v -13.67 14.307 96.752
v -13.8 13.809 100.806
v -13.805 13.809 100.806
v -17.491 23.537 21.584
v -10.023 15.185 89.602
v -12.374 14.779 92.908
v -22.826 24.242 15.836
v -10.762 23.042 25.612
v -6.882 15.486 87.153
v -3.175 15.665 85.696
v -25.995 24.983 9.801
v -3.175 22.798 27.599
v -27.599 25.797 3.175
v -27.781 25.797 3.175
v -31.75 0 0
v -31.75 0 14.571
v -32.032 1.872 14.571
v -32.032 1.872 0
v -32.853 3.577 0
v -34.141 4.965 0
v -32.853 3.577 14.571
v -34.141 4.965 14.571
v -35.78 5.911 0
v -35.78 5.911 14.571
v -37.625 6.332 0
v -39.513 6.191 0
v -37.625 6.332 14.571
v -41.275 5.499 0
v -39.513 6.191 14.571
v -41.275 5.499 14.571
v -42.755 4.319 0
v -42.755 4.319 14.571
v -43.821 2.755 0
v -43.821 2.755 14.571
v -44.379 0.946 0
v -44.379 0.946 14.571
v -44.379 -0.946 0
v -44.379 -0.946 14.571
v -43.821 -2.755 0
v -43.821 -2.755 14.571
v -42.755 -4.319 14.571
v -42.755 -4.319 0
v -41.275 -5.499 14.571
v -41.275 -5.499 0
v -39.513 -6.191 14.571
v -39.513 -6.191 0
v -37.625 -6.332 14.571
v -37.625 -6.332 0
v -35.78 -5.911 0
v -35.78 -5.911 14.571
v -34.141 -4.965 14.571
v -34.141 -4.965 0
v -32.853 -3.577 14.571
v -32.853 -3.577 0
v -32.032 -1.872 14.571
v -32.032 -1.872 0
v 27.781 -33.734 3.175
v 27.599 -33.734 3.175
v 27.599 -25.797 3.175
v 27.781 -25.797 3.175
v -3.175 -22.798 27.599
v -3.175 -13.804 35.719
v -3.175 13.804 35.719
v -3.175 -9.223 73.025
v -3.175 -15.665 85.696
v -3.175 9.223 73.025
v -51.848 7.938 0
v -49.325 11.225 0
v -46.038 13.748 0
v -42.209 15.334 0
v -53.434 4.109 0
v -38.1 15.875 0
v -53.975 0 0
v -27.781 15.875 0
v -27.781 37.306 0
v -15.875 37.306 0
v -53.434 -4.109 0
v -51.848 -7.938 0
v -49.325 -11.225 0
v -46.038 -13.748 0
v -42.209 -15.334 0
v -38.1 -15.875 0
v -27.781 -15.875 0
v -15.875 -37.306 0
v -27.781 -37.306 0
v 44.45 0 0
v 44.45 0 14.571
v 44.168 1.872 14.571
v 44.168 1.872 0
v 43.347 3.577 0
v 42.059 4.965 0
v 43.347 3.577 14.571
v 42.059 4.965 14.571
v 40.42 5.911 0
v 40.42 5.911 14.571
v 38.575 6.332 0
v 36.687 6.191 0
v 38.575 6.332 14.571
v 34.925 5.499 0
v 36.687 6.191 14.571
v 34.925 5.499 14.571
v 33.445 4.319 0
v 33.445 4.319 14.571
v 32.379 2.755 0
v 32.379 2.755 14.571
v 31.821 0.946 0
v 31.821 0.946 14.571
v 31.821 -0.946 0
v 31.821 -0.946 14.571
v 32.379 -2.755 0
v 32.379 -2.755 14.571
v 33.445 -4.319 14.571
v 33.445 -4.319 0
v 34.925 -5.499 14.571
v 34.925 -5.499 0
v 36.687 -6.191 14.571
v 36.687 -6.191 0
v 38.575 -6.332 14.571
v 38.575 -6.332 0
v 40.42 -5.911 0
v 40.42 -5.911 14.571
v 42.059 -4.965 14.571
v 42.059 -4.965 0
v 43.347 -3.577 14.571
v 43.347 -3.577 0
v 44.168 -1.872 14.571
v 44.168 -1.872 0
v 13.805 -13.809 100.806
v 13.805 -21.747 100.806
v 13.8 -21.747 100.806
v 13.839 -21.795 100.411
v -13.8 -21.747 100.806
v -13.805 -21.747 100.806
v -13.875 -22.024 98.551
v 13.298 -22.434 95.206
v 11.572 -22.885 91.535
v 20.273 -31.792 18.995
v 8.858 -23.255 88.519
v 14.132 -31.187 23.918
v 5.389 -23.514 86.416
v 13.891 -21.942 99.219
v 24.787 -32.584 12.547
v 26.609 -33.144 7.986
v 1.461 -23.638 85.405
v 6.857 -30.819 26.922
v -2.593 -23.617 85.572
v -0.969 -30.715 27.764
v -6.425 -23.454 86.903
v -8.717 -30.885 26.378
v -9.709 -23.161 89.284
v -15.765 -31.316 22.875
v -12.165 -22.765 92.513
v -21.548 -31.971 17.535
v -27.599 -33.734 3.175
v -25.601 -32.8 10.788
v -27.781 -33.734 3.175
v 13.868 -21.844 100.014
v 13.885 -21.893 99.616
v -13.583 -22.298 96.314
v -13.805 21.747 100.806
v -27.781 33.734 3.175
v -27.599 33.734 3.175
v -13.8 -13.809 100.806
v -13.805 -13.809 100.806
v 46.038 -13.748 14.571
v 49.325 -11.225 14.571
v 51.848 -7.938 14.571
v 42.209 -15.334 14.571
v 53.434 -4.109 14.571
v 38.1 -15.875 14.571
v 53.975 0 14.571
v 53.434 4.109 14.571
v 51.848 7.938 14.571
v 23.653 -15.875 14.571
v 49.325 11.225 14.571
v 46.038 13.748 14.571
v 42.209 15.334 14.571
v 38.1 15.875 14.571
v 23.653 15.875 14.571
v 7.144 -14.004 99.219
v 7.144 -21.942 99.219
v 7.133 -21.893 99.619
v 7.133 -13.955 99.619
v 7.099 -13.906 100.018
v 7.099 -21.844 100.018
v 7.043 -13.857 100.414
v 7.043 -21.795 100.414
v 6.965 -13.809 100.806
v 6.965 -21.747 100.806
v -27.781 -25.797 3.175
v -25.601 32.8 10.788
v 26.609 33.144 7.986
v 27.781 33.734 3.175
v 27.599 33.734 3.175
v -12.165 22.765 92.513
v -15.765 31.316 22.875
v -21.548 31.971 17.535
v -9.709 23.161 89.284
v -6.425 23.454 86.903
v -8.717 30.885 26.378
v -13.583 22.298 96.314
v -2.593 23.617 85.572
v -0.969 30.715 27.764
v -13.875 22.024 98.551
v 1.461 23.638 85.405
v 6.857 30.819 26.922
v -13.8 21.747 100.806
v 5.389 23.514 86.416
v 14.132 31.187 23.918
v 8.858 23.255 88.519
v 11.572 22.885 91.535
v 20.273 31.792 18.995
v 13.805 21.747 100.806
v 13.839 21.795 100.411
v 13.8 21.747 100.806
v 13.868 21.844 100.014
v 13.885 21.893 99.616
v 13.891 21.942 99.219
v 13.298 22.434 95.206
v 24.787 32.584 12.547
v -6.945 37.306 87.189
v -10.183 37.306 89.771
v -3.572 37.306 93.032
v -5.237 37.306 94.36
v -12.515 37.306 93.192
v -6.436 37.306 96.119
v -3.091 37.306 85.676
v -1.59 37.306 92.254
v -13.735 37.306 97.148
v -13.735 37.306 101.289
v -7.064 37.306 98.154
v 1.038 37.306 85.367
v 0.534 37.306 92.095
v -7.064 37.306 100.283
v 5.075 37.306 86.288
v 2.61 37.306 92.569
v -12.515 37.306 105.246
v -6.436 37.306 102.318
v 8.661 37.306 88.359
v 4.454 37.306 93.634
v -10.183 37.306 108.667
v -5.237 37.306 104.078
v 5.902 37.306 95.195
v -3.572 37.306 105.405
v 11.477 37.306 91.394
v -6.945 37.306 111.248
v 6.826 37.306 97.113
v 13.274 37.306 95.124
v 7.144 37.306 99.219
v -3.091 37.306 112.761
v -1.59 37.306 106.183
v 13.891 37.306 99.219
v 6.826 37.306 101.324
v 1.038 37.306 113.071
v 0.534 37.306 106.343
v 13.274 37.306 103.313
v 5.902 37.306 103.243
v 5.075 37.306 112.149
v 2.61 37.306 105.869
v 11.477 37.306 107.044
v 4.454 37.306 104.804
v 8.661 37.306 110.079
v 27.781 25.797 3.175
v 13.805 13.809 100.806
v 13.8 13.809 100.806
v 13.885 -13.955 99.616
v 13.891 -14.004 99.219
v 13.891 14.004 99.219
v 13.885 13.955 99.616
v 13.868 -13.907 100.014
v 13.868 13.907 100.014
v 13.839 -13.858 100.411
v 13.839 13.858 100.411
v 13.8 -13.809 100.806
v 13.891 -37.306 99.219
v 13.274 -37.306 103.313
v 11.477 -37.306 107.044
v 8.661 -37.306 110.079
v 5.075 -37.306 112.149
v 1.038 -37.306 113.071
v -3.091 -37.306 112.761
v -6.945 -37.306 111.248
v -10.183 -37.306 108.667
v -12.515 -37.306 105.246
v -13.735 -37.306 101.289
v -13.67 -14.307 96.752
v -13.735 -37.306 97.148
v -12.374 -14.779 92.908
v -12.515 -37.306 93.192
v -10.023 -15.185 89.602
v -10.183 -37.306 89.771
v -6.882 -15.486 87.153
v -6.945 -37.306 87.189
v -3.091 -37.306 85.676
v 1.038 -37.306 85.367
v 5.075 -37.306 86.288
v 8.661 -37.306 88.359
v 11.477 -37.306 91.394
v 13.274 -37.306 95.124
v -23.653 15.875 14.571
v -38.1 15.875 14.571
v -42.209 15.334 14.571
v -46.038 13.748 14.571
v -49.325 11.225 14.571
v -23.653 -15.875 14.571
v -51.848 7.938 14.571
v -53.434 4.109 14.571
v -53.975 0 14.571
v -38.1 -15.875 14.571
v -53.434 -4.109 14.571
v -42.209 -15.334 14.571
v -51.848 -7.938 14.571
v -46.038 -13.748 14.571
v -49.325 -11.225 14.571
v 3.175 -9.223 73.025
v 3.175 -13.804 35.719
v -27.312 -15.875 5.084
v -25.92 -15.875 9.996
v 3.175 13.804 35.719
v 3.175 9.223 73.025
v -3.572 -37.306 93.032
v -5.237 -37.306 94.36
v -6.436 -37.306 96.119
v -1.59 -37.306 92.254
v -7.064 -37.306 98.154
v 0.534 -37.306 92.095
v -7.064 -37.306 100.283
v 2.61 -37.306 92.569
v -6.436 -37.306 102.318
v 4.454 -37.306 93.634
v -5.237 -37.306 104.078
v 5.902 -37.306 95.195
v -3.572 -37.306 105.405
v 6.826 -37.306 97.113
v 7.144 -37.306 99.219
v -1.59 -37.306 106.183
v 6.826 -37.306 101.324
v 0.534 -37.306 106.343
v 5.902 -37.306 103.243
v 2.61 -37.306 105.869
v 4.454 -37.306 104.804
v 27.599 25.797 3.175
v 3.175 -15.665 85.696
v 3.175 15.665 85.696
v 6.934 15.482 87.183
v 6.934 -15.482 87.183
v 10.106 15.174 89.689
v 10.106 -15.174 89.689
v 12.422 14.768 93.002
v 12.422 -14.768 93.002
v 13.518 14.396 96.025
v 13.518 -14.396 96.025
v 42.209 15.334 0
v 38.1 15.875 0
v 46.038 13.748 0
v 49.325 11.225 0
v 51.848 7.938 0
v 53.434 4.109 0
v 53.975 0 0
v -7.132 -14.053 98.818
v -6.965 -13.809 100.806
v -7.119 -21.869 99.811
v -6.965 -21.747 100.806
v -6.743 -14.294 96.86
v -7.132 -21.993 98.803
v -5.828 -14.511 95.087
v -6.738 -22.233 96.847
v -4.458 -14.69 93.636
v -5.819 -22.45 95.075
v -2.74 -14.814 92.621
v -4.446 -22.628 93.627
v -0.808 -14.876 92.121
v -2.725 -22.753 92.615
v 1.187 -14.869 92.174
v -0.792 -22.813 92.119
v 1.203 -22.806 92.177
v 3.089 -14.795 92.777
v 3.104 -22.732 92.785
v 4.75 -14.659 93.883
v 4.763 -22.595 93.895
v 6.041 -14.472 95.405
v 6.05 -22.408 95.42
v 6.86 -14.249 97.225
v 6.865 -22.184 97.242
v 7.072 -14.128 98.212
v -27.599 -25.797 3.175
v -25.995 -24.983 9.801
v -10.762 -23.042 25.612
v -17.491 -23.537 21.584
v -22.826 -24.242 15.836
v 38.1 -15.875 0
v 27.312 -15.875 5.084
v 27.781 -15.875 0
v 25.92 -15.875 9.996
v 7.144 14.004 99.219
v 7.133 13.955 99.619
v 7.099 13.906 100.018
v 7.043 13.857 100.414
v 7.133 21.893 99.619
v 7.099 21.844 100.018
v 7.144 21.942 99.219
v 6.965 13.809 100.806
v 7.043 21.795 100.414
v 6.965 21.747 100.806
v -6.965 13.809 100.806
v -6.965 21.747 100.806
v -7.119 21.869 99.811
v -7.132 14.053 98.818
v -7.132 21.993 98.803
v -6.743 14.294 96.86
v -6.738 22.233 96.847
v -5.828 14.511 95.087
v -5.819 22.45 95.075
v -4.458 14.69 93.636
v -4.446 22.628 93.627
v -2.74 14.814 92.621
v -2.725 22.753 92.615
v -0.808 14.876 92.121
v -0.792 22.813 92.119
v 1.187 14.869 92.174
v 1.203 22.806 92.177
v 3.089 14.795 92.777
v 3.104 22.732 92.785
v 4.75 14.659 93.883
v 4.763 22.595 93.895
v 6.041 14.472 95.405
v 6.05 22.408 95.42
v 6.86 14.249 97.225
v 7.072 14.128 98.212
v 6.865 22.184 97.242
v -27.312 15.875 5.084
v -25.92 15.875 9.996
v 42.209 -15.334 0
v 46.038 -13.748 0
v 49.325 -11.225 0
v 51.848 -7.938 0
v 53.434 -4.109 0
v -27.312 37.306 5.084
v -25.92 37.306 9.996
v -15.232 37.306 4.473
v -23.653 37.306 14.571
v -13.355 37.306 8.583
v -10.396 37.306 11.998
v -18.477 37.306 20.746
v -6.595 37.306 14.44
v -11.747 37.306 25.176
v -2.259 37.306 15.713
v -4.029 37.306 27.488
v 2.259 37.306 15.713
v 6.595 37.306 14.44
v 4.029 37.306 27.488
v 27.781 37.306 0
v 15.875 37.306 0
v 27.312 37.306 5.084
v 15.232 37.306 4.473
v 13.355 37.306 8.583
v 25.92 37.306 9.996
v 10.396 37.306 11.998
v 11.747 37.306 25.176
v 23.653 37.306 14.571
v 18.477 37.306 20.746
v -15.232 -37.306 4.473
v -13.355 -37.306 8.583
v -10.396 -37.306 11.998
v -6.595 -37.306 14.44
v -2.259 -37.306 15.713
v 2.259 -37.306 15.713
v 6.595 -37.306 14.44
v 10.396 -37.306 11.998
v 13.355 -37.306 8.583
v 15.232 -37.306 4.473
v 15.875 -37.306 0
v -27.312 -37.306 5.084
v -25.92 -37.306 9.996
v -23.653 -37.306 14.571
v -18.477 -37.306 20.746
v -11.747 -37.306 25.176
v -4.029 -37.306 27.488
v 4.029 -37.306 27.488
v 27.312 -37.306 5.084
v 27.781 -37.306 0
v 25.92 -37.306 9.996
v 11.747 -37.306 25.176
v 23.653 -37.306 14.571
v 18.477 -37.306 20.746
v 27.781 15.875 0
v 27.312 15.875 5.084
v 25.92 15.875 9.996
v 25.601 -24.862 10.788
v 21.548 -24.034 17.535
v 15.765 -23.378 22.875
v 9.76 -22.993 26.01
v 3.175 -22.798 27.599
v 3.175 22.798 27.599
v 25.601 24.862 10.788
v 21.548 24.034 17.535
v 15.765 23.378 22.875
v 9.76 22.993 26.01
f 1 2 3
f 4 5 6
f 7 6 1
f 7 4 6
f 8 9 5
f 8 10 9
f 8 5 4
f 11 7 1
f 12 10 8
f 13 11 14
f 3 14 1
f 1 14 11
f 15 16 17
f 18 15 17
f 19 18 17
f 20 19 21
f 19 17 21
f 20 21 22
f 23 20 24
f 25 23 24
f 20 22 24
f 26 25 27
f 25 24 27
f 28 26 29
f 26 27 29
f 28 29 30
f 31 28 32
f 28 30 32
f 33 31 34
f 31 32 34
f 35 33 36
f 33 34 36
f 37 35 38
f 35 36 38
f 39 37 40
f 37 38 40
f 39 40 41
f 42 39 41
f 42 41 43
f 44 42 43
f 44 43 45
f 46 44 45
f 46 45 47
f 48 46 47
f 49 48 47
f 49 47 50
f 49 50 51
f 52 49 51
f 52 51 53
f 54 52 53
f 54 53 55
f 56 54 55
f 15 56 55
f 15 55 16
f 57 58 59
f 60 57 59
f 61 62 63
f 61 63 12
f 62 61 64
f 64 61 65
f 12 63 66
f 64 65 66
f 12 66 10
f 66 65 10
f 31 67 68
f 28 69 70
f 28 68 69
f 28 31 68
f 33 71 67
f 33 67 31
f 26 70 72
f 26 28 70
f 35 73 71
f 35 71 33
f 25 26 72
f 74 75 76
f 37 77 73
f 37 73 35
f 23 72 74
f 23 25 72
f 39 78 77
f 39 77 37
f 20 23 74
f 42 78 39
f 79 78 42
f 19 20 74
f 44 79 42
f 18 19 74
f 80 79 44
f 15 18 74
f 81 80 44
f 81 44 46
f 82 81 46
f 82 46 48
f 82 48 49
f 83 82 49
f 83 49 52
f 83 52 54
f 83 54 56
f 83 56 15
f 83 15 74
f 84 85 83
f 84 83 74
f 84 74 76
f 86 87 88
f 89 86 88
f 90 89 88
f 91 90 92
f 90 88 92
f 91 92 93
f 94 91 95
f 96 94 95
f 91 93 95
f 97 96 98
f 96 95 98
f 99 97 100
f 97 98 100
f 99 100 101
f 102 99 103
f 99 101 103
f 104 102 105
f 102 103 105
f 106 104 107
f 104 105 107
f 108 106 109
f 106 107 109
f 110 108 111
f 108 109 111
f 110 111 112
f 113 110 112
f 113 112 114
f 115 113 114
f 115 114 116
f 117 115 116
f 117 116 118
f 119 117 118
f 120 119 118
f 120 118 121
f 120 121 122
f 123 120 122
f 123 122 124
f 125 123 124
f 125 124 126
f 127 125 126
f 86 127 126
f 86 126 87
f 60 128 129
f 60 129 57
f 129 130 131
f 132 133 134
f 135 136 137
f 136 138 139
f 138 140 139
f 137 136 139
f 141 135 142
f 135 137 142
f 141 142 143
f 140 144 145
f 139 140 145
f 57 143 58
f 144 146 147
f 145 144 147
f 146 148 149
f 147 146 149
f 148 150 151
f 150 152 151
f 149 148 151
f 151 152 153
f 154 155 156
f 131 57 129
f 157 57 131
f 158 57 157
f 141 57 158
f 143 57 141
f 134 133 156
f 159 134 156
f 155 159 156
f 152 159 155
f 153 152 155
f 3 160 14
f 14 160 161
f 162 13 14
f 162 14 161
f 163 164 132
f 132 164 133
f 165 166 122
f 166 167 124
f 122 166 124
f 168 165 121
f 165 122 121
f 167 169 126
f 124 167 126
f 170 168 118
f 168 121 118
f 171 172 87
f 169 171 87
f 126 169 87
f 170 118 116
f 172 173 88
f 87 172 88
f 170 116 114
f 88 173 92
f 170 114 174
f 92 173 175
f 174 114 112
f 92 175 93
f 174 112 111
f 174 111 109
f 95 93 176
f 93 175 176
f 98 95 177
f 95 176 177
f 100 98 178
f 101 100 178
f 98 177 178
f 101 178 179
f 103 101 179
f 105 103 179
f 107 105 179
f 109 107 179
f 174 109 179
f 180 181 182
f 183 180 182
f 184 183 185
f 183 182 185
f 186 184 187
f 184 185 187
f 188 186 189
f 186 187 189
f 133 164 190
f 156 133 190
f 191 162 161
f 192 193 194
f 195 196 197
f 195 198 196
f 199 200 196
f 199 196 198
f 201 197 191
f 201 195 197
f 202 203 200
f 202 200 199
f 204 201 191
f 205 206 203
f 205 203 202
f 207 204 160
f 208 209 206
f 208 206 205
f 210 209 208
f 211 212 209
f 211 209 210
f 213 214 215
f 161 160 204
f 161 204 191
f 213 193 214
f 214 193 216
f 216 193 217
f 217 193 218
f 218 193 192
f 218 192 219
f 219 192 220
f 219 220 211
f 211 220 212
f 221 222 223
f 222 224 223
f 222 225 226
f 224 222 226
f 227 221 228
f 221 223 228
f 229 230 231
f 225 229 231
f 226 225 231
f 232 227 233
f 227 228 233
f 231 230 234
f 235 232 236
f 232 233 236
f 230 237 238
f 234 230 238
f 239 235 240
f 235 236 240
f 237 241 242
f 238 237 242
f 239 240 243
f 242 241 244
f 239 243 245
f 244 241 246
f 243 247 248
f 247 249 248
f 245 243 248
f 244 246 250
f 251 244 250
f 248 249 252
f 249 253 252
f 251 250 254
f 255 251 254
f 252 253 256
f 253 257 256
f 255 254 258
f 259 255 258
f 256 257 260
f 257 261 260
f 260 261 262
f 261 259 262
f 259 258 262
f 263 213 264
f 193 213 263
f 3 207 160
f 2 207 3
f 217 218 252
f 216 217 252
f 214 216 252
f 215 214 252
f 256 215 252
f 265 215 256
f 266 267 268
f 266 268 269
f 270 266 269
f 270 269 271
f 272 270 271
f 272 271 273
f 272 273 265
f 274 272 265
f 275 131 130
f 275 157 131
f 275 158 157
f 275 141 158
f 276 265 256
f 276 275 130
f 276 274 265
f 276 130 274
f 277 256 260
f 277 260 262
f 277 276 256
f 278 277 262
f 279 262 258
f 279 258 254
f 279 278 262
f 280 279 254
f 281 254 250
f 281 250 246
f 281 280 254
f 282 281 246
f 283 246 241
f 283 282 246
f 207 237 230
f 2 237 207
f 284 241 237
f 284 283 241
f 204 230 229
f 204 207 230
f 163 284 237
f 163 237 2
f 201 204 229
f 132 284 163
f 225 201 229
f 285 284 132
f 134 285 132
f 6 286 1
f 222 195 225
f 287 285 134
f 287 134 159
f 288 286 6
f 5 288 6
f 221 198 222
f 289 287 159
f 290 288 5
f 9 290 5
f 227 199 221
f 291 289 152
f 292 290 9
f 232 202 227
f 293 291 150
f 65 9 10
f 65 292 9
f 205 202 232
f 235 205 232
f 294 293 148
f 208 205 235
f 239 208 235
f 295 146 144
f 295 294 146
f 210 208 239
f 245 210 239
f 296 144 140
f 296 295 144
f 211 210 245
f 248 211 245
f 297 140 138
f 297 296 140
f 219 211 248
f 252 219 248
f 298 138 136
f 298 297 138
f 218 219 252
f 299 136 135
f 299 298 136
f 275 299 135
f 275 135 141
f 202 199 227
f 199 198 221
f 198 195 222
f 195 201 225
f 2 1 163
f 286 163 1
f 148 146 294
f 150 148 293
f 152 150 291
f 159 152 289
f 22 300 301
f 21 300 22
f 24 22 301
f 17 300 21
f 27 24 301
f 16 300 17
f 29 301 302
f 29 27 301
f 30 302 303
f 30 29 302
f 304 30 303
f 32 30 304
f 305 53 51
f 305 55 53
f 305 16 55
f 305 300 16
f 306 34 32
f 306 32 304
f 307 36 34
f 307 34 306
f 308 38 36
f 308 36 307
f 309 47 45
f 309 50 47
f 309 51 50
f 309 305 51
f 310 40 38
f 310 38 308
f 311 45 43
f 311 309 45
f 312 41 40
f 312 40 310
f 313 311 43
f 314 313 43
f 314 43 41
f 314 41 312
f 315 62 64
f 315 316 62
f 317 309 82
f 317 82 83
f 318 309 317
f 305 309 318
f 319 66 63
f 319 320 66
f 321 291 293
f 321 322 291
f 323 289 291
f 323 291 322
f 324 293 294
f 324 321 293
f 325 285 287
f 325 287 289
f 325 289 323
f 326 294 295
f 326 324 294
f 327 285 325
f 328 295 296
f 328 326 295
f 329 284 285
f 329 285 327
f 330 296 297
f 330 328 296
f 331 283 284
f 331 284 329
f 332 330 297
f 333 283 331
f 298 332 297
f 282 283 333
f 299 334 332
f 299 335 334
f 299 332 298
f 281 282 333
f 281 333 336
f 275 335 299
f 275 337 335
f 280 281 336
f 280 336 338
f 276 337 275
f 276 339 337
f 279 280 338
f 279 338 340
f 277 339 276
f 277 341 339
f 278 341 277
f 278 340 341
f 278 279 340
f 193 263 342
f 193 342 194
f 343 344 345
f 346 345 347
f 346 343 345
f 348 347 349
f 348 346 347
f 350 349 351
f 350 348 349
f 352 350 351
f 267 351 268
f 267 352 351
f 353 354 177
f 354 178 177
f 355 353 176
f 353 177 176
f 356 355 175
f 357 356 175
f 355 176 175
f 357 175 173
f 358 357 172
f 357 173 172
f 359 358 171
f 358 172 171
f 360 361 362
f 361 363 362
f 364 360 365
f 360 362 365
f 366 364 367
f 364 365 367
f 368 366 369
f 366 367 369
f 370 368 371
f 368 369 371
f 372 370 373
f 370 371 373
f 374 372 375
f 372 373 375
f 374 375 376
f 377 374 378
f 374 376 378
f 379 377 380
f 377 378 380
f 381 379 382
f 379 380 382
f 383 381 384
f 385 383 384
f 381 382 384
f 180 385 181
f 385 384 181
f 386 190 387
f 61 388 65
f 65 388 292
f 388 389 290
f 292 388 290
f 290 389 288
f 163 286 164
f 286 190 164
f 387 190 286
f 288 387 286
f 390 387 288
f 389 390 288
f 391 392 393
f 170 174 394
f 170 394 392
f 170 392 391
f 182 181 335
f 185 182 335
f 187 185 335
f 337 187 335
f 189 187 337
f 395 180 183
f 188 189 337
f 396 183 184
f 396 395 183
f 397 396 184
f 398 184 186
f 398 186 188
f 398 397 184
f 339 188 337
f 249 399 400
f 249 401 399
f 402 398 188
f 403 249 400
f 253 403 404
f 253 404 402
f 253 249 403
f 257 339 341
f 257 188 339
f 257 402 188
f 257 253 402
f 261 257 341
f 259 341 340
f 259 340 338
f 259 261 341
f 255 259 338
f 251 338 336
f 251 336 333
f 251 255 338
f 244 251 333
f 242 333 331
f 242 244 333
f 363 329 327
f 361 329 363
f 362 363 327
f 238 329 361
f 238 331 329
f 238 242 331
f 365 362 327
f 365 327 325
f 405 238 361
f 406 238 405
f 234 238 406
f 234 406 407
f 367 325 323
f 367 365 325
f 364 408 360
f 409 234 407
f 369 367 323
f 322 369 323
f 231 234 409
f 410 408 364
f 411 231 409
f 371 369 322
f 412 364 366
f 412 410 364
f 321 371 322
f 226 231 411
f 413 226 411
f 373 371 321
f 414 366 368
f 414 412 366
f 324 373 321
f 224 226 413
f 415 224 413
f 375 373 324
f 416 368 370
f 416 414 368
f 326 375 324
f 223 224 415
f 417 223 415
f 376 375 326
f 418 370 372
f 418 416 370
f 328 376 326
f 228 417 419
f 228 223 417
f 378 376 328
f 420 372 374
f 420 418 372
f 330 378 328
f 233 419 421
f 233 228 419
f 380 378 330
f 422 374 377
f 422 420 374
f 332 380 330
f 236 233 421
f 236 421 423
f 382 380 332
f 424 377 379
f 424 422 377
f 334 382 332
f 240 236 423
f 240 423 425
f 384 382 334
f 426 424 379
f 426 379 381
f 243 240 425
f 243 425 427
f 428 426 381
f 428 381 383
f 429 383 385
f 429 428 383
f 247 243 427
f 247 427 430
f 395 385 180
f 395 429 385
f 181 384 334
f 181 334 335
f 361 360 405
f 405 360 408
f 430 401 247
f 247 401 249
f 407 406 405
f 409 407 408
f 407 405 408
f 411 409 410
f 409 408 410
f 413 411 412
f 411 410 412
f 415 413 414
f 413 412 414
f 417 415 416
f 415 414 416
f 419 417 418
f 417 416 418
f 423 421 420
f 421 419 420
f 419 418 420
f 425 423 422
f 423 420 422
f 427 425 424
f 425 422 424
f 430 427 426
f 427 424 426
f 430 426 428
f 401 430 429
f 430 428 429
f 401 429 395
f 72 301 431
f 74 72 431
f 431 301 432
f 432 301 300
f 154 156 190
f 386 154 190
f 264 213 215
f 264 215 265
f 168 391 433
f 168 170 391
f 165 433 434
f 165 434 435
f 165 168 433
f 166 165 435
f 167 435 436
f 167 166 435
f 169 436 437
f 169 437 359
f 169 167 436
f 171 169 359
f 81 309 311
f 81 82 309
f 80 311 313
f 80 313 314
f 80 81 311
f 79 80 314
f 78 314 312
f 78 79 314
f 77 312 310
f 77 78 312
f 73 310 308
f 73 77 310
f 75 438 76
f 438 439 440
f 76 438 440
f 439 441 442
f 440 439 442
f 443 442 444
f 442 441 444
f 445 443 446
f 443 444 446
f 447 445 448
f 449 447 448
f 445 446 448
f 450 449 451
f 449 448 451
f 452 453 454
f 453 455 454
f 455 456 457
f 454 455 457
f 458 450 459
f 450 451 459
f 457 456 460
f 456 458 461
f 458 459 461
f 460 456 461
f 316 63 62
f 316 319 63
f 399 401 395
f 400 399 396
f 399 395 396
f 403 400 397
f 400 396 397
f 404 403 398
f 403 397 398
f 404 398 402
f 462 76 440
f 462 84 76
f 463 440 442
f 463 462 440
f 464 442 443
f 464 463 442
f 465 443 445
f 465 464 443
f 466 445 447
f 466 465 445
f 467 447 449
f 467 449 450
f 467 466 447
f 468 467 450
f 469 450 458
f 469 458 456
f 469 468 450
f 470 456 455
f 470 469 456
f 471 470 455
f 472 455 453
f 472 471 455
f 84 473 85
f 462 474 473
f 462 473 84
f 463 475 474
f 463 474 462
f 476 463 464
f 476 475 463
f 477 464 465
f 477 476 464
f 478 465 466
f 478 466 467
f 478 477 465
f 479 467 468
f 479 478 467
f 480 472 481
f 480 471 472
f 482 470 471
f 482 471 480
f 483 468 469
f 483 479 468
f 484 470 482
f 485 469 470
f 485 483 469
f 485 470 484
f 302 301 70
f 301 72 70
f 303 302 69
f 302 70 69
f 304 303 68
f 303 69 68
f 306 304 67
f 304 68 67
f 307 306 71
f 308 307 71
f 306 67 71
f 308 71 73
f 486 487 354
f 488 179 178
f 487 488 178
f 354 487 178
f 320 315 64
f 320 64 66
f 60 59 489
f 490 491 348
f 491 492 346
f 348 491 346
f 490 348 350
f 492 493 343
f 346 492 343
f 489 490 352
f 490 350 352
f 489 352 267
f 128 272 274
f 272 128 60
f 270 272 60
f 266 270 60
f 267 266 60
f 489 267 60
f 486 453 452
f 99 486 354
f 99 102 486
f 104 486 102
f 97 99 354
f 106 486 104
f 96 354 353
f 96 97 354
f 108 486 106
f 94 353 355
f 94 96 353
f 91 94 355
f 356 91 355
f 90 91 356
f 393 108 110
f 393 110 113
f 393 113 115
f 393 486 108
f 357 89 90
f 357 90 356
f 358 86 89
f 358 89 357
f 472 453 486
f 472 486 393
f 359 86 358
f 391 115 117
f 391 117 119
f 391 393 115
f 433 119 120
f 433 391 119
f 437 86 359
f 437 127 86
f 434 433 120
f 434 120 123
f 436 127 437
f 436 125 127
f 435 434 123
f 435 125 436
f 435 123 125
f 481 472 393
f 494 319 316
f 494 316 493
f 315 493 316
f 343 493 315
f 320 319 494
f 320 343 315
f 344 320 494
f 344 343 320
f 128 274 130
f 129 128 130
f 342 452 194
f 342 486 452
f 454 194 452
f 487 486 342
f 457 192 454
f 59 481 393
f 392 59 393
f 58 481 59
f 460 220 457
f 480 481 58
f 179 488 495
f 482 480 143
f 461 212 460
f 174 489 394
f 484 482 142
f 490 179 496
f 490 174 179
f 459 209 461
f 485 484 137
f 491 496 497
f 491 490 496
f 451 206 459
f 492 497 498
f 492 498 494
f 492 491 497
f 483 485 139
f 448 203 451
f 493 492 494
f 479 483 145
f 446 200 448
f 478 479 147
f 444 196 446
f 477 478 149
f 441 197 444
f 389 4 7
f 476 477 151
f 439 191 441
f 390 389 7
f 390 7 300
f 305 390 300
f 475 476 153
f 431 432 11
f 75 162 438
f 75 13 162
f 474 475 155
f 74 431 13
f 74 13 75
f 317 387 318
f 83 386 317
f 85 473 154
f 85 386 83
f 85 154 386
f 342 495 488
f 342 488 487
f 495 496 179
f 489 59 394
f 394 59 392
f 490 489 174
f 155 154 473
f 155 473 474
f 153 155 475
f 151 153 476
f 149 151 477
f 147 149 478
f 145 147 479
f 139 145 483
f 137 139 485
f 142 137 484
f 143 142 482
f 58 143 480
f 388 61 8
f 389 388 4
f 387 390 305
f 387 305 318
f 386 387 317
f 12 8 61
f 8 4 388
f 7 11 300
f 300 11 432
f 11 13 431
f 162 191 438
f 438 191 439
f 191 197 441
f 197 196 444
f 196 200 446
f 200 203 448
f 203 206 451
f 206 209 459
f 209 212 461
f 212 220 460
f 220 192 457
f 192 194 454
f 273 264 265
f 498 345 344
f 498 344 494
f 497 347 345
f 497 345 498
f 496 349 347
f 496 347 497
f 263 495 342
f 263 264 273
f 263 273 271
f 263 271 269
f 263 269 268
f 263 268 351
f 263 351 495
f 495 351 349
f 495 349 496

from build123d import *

# Parameters (mm, degrees)
F1_DEPTH     = 37.30625
F2_DEPTH     = 15.875
F3_R         = 15.87499
F0_R         = 13.890625
F0_R_2       = 7.14375
F4_DEPTH     = 37.30625
F6_DEPTH     = 3.175
F7_DEPTH     = 27.78125
F8_T4_DEPTH  = 515.4304915521
F8_T9_DEPTH  = 515.4304915521
F8_T14_DEPTH = 515.4304915521
F8_T19_DEPTH = 515.4304915521
F8_T24_DEPTH = 515.4304915521
F8_T29_DEPTH = 515.4304915521
F9_DEPTH     = 50.8
F10_R        = 6.35
F11_DEPTH    = 14.5721768419
F12_DEPTH    = 38.1


# Not quite as in the source:
# - a fillet or chamfer that OpenCascade refuses, or shapes differently, is made with other operations: its cross-section is extruded or revolved along the edge and cut away or added
# - a fillet or chamfer is up to 0.001 mm smaller than in the source, because OpenCascade refuses the exact size
# - a feature of the source that left no trace in its solid (it failed there, or was rolled back) is left out


with BuildPart() as f1:
    # F0 (on Front) → F1 (new body, symmetric)
    with BuildSketch(Plane.XZ):
        with BuildLine():
            Line((15.875, 0), (27.78125, 0))
            ThreePointArc((27.78125, 0), (26.7293483379, 7.5723040742), (23.6533011862, 14.5711768419))
            ThreePointArc((23.6533011862, 14.5711768419), (0, 27.78125), (-23.6533011862, 14.5711768419))
            ThreePointArc((-23.6533011862, 14.5711768419), (-26.7293483379, 7.5723040742), (-27.78125, 0))
            Line((-27.78125, 0), (-15.875, 0))
            ThreePointArc((-15.875, 0), (0, 15.875), (15.875, 0))
        make_face()
    extrude(amount=F1_DEPTH, both=True)

    # F0 (on Front) → F2 (join, symmetric)
    with BuildSketch(Plane.XZ):
        with BuildLine():
            ThreePointArc((23.6533011862, 14.5711768419), (26.7293483379, 7.5723040742), (27.78125, 0))
            Line((27.78125, 0), (53.975, 0))
            Line((53.975, 0), (53.975, 14.5711768419))
            Line((53.975, 14.5711768419), (23.6533011862, 14.5711768419))
        make_face()
        with BuildLine():
            ThreePointArc((-27.78125, 0), (-26.7293483379, 7.5723040742), (-23.6533011862, 14.5711768419))
            Line((-23.6533011862, 14.5711768419), (-53.975, 14.5711768419))
            Line((-53.975, 14.5711768419), (-53.975, 0))
            Line((-53.975, 0), (-27.78125, 0))
        make_face()
    extrude(amount=F2_DEPTH, both=True)

    # F3 (radius 15.875 in the source; OpenCascade refuses exactly that, so slightly less here)
    f3_edges = [f1.edges().sort_by_distance(p)[0] for p in [
        (53.975, -15.875, 7.285588),
        (53.975, 15.875, 7.285588),
        (-53.975, -15.875, 7.285588),
        (-53.975, 15.875, 7.285588),
    ]]
    fillet(f3_edges, radius=F3_R)



with BuildPart() as f4:
    # F0 (on Front) → F4 (new body, symmetric)
    with BuildSketch(Plane.XZ):
        with Locations((0, 99.21875)):
            Circle(F0_R)
        with Locations((0, 99.21875)):
            Circle(F0_R_2, mode=Mode.SUBTRACT)
    extrude(amount=F4_DEPTH, both=True)


with BuildPart() as f1_1:
    add(f1.part)

    add(f4.part)  # F6 merges F4
    # F5 (on Right) → F6 (join, symmetric)
    with BuildSketch(Plane.YZ):
        Polygon((-15.1982219998, 89.4941017032), (-23.1018472504, 25.1242396258), (23.1018472504, 25.1242396258), (15.1982219998, 89.4941017032), align=None)
        Polygon((-9.2232641814, 73.025), (9.2232641814, 73.025), (13.8038957065, 35.71875), (-13.8038957065, 35.71875), align=None, mode=Mode.SUBTRACT)
    extrude(amount=F6_DEPTH, both=True)

    # F5 (on Right) → F7 (join, symmetric)
    with BuildSketch(Plane.YZ):
        Polygon((-21.7467648383, 100.80625), (-33.734375, 3.175), (-25.796875, 3.175), (-23.1018472504, 25.1242396258), (-15.1982219998, 89.4941017032), (-13.8092648383, 100.80625), align=None)
        Polygon((15.1982219998, 89.4941017032), (23.1018472504, 25.1242396258), (25.796875, 3.175), (33.734375, 3.175), (21.7467648383, 100.80625), (13.8092648383, 100.80625), align=None)
    extrude(amount=F7_DEPTH, both=True)

    # F8: chamfer of 13.9762738 x 97.63125 on 2 edges, made by hand


with BuildPart() as f8_tool2:
    # F8_s3 → F8_t4 (new body)
    with BuildSketch(Plane.XZ.offset(-275.4932606144)):
        Polygon((13.8049762, 100.80625), (27.78125, 3.175), (27.78125, 100.80625), align=None)
    extrude(amount=F8_T4_DEPTH)

    split(bisect_by=Plane.XY.offset(14.5711768419), keep=Keep.TOP)


with BuildPart() as f1_2:
    add(f1_1.part)

    # F8_t1: cut F8_tool2
    add(f8_tool2.part, mode=Mode.SUBTRACT)


with BuildPart() as f8_tool7:
    # F8_s8 → F8_t9 (new body)
    with BuildSketch(Plane.XZ.offset(-275.4932606144)):
        Polygon((13.8049762, 100.80625), (27.78125, 3.175), (27.78125, 100.80625), align=None)
    extrude(amount=F8_T9_DEPTH)

    split(bisect_by=Plane.XZ.offset(-15.875), keep=Keep.BOTTOM)


with BuildPart() as f1_3:
    add(f1_2.part)

    # F8_t6: cut F8_tool7
    add(f8_tool7.part, mode=Mode.SUBTRACT)


with BuildPart() as f8_tool12:
    # F8_s13 → F8_t14 (new body)
    with BuildSketch(Plane.XZ.offset(-275.4932606144)):
        Polygon((13.8049762, 100.80625), (27.78125, 3.175), (27.78125, 100.80625), align=None)
    extrude(amount=F8_T14_DEPTH)

    split(bisect_by=Plane.XZ.offset(15.875), keep=Keep.TOP)


with BuildPart() as f1_4:
    add(f1_3.part)

    # F8_t11: cut F8_tool12
    add(f8_tool12.part, mode=Mode.SUBTRACT)


with BuildPart() as f8_tool17:
    # F8_s18 → F8_t19 (new body)
    with BuildSketch(Plane.XZ.offset(-239.9372309377)):
        Polygon((-13.8049762, 100.80625), (-27.78125, 3.175), (-27.78125, 100.80625), align=None)
    extrude(amount=F8_T19_DEPTH)

    split(bisect_by=Plane.XY.offset(14.5711768419), keep=Keep.TOP)


with BuildPart() as f1_5:
    add(f1_4.part)

    # F8_t16: cut F8_tool17
    add(f8_tool17.part, mode=Mode.SUBTRACT)


with BuildPart() as f8_tool22:
    # F8_s23 → F8_t24 (new body)
    with BuildSketch(Plane.XZ.offset(-239.9372309377)):
        Polygon((-13.8049762, 100.80625), (-27.78125, 3.175), (-27.78125, 100.80625), align=None)
    extrude(amount=F8_T24_DEPTH)

    split(bisect_by=Plane.XZ.offset(-15.875), keep=Keep.BOTTOM)


with BuildPart() as f1_6:
    add(f1_5.part)

    # F8_t21: cut F8_tool22
    add(f8_tool22.part, mode=Mode.SUBTRACT)


with BuildPart() as f8_tool27:
    # F8_s28 → F8_t29 (new body)
    with BuildSketch(Plane.XZ.offset(-239.9372309377)):
        Polygon((-13.8049762, 100.80625), (-27.78125, 3.175), (-27.78125, 100.80625), align=None)
    extrude(amount=F8_T29_DEPTH)

    split(bisect_by=Plane.XZ.offset(15.875), keep=Keep.TOP)


with BuildPart() as f1_7:
    add(f1_6.part)

    # F8_t26: cut F8_tool27
    add(f8_tool27.part, mode=Mode.SUBTRACT)

    # F0 (on Front) → F9 (cut, symmetric)
    with BuildSketch(Plane.XZ):
        with BuildLine():
            Line((-15.875, 0), (15.875, 0))
            ThreePointArc((15.875, 0), (0, 15.875), (-15.875, 0))
        make_face()
    extrude(amount=F9_DEPTH, both=True, mode=Mode.SUBTRACT)

    # F10 (on face) → F11 (cut, through all)
    with BuildSketch(Plane.XY.offset(14.5711768419)):
        with Locations((-38.1, 0)):
            Circle(F10_R)
        with Locations((38.1, 0)):
            Circle(F10_R)
    extrude(amount=-F11_DEPTH, mode=Mode.SUBTRACT)

    # F0 (on Front) → F12 (cut, symmetric)
    with BuildSketch(Plane.XZ):
        with Locations((0, 99.21875)):
            Circle(F0_R_2)
    extrude(amount=F12_DEPTH, both=True, mode=Mode.SUBTRACT)


solid = f1_7.part
